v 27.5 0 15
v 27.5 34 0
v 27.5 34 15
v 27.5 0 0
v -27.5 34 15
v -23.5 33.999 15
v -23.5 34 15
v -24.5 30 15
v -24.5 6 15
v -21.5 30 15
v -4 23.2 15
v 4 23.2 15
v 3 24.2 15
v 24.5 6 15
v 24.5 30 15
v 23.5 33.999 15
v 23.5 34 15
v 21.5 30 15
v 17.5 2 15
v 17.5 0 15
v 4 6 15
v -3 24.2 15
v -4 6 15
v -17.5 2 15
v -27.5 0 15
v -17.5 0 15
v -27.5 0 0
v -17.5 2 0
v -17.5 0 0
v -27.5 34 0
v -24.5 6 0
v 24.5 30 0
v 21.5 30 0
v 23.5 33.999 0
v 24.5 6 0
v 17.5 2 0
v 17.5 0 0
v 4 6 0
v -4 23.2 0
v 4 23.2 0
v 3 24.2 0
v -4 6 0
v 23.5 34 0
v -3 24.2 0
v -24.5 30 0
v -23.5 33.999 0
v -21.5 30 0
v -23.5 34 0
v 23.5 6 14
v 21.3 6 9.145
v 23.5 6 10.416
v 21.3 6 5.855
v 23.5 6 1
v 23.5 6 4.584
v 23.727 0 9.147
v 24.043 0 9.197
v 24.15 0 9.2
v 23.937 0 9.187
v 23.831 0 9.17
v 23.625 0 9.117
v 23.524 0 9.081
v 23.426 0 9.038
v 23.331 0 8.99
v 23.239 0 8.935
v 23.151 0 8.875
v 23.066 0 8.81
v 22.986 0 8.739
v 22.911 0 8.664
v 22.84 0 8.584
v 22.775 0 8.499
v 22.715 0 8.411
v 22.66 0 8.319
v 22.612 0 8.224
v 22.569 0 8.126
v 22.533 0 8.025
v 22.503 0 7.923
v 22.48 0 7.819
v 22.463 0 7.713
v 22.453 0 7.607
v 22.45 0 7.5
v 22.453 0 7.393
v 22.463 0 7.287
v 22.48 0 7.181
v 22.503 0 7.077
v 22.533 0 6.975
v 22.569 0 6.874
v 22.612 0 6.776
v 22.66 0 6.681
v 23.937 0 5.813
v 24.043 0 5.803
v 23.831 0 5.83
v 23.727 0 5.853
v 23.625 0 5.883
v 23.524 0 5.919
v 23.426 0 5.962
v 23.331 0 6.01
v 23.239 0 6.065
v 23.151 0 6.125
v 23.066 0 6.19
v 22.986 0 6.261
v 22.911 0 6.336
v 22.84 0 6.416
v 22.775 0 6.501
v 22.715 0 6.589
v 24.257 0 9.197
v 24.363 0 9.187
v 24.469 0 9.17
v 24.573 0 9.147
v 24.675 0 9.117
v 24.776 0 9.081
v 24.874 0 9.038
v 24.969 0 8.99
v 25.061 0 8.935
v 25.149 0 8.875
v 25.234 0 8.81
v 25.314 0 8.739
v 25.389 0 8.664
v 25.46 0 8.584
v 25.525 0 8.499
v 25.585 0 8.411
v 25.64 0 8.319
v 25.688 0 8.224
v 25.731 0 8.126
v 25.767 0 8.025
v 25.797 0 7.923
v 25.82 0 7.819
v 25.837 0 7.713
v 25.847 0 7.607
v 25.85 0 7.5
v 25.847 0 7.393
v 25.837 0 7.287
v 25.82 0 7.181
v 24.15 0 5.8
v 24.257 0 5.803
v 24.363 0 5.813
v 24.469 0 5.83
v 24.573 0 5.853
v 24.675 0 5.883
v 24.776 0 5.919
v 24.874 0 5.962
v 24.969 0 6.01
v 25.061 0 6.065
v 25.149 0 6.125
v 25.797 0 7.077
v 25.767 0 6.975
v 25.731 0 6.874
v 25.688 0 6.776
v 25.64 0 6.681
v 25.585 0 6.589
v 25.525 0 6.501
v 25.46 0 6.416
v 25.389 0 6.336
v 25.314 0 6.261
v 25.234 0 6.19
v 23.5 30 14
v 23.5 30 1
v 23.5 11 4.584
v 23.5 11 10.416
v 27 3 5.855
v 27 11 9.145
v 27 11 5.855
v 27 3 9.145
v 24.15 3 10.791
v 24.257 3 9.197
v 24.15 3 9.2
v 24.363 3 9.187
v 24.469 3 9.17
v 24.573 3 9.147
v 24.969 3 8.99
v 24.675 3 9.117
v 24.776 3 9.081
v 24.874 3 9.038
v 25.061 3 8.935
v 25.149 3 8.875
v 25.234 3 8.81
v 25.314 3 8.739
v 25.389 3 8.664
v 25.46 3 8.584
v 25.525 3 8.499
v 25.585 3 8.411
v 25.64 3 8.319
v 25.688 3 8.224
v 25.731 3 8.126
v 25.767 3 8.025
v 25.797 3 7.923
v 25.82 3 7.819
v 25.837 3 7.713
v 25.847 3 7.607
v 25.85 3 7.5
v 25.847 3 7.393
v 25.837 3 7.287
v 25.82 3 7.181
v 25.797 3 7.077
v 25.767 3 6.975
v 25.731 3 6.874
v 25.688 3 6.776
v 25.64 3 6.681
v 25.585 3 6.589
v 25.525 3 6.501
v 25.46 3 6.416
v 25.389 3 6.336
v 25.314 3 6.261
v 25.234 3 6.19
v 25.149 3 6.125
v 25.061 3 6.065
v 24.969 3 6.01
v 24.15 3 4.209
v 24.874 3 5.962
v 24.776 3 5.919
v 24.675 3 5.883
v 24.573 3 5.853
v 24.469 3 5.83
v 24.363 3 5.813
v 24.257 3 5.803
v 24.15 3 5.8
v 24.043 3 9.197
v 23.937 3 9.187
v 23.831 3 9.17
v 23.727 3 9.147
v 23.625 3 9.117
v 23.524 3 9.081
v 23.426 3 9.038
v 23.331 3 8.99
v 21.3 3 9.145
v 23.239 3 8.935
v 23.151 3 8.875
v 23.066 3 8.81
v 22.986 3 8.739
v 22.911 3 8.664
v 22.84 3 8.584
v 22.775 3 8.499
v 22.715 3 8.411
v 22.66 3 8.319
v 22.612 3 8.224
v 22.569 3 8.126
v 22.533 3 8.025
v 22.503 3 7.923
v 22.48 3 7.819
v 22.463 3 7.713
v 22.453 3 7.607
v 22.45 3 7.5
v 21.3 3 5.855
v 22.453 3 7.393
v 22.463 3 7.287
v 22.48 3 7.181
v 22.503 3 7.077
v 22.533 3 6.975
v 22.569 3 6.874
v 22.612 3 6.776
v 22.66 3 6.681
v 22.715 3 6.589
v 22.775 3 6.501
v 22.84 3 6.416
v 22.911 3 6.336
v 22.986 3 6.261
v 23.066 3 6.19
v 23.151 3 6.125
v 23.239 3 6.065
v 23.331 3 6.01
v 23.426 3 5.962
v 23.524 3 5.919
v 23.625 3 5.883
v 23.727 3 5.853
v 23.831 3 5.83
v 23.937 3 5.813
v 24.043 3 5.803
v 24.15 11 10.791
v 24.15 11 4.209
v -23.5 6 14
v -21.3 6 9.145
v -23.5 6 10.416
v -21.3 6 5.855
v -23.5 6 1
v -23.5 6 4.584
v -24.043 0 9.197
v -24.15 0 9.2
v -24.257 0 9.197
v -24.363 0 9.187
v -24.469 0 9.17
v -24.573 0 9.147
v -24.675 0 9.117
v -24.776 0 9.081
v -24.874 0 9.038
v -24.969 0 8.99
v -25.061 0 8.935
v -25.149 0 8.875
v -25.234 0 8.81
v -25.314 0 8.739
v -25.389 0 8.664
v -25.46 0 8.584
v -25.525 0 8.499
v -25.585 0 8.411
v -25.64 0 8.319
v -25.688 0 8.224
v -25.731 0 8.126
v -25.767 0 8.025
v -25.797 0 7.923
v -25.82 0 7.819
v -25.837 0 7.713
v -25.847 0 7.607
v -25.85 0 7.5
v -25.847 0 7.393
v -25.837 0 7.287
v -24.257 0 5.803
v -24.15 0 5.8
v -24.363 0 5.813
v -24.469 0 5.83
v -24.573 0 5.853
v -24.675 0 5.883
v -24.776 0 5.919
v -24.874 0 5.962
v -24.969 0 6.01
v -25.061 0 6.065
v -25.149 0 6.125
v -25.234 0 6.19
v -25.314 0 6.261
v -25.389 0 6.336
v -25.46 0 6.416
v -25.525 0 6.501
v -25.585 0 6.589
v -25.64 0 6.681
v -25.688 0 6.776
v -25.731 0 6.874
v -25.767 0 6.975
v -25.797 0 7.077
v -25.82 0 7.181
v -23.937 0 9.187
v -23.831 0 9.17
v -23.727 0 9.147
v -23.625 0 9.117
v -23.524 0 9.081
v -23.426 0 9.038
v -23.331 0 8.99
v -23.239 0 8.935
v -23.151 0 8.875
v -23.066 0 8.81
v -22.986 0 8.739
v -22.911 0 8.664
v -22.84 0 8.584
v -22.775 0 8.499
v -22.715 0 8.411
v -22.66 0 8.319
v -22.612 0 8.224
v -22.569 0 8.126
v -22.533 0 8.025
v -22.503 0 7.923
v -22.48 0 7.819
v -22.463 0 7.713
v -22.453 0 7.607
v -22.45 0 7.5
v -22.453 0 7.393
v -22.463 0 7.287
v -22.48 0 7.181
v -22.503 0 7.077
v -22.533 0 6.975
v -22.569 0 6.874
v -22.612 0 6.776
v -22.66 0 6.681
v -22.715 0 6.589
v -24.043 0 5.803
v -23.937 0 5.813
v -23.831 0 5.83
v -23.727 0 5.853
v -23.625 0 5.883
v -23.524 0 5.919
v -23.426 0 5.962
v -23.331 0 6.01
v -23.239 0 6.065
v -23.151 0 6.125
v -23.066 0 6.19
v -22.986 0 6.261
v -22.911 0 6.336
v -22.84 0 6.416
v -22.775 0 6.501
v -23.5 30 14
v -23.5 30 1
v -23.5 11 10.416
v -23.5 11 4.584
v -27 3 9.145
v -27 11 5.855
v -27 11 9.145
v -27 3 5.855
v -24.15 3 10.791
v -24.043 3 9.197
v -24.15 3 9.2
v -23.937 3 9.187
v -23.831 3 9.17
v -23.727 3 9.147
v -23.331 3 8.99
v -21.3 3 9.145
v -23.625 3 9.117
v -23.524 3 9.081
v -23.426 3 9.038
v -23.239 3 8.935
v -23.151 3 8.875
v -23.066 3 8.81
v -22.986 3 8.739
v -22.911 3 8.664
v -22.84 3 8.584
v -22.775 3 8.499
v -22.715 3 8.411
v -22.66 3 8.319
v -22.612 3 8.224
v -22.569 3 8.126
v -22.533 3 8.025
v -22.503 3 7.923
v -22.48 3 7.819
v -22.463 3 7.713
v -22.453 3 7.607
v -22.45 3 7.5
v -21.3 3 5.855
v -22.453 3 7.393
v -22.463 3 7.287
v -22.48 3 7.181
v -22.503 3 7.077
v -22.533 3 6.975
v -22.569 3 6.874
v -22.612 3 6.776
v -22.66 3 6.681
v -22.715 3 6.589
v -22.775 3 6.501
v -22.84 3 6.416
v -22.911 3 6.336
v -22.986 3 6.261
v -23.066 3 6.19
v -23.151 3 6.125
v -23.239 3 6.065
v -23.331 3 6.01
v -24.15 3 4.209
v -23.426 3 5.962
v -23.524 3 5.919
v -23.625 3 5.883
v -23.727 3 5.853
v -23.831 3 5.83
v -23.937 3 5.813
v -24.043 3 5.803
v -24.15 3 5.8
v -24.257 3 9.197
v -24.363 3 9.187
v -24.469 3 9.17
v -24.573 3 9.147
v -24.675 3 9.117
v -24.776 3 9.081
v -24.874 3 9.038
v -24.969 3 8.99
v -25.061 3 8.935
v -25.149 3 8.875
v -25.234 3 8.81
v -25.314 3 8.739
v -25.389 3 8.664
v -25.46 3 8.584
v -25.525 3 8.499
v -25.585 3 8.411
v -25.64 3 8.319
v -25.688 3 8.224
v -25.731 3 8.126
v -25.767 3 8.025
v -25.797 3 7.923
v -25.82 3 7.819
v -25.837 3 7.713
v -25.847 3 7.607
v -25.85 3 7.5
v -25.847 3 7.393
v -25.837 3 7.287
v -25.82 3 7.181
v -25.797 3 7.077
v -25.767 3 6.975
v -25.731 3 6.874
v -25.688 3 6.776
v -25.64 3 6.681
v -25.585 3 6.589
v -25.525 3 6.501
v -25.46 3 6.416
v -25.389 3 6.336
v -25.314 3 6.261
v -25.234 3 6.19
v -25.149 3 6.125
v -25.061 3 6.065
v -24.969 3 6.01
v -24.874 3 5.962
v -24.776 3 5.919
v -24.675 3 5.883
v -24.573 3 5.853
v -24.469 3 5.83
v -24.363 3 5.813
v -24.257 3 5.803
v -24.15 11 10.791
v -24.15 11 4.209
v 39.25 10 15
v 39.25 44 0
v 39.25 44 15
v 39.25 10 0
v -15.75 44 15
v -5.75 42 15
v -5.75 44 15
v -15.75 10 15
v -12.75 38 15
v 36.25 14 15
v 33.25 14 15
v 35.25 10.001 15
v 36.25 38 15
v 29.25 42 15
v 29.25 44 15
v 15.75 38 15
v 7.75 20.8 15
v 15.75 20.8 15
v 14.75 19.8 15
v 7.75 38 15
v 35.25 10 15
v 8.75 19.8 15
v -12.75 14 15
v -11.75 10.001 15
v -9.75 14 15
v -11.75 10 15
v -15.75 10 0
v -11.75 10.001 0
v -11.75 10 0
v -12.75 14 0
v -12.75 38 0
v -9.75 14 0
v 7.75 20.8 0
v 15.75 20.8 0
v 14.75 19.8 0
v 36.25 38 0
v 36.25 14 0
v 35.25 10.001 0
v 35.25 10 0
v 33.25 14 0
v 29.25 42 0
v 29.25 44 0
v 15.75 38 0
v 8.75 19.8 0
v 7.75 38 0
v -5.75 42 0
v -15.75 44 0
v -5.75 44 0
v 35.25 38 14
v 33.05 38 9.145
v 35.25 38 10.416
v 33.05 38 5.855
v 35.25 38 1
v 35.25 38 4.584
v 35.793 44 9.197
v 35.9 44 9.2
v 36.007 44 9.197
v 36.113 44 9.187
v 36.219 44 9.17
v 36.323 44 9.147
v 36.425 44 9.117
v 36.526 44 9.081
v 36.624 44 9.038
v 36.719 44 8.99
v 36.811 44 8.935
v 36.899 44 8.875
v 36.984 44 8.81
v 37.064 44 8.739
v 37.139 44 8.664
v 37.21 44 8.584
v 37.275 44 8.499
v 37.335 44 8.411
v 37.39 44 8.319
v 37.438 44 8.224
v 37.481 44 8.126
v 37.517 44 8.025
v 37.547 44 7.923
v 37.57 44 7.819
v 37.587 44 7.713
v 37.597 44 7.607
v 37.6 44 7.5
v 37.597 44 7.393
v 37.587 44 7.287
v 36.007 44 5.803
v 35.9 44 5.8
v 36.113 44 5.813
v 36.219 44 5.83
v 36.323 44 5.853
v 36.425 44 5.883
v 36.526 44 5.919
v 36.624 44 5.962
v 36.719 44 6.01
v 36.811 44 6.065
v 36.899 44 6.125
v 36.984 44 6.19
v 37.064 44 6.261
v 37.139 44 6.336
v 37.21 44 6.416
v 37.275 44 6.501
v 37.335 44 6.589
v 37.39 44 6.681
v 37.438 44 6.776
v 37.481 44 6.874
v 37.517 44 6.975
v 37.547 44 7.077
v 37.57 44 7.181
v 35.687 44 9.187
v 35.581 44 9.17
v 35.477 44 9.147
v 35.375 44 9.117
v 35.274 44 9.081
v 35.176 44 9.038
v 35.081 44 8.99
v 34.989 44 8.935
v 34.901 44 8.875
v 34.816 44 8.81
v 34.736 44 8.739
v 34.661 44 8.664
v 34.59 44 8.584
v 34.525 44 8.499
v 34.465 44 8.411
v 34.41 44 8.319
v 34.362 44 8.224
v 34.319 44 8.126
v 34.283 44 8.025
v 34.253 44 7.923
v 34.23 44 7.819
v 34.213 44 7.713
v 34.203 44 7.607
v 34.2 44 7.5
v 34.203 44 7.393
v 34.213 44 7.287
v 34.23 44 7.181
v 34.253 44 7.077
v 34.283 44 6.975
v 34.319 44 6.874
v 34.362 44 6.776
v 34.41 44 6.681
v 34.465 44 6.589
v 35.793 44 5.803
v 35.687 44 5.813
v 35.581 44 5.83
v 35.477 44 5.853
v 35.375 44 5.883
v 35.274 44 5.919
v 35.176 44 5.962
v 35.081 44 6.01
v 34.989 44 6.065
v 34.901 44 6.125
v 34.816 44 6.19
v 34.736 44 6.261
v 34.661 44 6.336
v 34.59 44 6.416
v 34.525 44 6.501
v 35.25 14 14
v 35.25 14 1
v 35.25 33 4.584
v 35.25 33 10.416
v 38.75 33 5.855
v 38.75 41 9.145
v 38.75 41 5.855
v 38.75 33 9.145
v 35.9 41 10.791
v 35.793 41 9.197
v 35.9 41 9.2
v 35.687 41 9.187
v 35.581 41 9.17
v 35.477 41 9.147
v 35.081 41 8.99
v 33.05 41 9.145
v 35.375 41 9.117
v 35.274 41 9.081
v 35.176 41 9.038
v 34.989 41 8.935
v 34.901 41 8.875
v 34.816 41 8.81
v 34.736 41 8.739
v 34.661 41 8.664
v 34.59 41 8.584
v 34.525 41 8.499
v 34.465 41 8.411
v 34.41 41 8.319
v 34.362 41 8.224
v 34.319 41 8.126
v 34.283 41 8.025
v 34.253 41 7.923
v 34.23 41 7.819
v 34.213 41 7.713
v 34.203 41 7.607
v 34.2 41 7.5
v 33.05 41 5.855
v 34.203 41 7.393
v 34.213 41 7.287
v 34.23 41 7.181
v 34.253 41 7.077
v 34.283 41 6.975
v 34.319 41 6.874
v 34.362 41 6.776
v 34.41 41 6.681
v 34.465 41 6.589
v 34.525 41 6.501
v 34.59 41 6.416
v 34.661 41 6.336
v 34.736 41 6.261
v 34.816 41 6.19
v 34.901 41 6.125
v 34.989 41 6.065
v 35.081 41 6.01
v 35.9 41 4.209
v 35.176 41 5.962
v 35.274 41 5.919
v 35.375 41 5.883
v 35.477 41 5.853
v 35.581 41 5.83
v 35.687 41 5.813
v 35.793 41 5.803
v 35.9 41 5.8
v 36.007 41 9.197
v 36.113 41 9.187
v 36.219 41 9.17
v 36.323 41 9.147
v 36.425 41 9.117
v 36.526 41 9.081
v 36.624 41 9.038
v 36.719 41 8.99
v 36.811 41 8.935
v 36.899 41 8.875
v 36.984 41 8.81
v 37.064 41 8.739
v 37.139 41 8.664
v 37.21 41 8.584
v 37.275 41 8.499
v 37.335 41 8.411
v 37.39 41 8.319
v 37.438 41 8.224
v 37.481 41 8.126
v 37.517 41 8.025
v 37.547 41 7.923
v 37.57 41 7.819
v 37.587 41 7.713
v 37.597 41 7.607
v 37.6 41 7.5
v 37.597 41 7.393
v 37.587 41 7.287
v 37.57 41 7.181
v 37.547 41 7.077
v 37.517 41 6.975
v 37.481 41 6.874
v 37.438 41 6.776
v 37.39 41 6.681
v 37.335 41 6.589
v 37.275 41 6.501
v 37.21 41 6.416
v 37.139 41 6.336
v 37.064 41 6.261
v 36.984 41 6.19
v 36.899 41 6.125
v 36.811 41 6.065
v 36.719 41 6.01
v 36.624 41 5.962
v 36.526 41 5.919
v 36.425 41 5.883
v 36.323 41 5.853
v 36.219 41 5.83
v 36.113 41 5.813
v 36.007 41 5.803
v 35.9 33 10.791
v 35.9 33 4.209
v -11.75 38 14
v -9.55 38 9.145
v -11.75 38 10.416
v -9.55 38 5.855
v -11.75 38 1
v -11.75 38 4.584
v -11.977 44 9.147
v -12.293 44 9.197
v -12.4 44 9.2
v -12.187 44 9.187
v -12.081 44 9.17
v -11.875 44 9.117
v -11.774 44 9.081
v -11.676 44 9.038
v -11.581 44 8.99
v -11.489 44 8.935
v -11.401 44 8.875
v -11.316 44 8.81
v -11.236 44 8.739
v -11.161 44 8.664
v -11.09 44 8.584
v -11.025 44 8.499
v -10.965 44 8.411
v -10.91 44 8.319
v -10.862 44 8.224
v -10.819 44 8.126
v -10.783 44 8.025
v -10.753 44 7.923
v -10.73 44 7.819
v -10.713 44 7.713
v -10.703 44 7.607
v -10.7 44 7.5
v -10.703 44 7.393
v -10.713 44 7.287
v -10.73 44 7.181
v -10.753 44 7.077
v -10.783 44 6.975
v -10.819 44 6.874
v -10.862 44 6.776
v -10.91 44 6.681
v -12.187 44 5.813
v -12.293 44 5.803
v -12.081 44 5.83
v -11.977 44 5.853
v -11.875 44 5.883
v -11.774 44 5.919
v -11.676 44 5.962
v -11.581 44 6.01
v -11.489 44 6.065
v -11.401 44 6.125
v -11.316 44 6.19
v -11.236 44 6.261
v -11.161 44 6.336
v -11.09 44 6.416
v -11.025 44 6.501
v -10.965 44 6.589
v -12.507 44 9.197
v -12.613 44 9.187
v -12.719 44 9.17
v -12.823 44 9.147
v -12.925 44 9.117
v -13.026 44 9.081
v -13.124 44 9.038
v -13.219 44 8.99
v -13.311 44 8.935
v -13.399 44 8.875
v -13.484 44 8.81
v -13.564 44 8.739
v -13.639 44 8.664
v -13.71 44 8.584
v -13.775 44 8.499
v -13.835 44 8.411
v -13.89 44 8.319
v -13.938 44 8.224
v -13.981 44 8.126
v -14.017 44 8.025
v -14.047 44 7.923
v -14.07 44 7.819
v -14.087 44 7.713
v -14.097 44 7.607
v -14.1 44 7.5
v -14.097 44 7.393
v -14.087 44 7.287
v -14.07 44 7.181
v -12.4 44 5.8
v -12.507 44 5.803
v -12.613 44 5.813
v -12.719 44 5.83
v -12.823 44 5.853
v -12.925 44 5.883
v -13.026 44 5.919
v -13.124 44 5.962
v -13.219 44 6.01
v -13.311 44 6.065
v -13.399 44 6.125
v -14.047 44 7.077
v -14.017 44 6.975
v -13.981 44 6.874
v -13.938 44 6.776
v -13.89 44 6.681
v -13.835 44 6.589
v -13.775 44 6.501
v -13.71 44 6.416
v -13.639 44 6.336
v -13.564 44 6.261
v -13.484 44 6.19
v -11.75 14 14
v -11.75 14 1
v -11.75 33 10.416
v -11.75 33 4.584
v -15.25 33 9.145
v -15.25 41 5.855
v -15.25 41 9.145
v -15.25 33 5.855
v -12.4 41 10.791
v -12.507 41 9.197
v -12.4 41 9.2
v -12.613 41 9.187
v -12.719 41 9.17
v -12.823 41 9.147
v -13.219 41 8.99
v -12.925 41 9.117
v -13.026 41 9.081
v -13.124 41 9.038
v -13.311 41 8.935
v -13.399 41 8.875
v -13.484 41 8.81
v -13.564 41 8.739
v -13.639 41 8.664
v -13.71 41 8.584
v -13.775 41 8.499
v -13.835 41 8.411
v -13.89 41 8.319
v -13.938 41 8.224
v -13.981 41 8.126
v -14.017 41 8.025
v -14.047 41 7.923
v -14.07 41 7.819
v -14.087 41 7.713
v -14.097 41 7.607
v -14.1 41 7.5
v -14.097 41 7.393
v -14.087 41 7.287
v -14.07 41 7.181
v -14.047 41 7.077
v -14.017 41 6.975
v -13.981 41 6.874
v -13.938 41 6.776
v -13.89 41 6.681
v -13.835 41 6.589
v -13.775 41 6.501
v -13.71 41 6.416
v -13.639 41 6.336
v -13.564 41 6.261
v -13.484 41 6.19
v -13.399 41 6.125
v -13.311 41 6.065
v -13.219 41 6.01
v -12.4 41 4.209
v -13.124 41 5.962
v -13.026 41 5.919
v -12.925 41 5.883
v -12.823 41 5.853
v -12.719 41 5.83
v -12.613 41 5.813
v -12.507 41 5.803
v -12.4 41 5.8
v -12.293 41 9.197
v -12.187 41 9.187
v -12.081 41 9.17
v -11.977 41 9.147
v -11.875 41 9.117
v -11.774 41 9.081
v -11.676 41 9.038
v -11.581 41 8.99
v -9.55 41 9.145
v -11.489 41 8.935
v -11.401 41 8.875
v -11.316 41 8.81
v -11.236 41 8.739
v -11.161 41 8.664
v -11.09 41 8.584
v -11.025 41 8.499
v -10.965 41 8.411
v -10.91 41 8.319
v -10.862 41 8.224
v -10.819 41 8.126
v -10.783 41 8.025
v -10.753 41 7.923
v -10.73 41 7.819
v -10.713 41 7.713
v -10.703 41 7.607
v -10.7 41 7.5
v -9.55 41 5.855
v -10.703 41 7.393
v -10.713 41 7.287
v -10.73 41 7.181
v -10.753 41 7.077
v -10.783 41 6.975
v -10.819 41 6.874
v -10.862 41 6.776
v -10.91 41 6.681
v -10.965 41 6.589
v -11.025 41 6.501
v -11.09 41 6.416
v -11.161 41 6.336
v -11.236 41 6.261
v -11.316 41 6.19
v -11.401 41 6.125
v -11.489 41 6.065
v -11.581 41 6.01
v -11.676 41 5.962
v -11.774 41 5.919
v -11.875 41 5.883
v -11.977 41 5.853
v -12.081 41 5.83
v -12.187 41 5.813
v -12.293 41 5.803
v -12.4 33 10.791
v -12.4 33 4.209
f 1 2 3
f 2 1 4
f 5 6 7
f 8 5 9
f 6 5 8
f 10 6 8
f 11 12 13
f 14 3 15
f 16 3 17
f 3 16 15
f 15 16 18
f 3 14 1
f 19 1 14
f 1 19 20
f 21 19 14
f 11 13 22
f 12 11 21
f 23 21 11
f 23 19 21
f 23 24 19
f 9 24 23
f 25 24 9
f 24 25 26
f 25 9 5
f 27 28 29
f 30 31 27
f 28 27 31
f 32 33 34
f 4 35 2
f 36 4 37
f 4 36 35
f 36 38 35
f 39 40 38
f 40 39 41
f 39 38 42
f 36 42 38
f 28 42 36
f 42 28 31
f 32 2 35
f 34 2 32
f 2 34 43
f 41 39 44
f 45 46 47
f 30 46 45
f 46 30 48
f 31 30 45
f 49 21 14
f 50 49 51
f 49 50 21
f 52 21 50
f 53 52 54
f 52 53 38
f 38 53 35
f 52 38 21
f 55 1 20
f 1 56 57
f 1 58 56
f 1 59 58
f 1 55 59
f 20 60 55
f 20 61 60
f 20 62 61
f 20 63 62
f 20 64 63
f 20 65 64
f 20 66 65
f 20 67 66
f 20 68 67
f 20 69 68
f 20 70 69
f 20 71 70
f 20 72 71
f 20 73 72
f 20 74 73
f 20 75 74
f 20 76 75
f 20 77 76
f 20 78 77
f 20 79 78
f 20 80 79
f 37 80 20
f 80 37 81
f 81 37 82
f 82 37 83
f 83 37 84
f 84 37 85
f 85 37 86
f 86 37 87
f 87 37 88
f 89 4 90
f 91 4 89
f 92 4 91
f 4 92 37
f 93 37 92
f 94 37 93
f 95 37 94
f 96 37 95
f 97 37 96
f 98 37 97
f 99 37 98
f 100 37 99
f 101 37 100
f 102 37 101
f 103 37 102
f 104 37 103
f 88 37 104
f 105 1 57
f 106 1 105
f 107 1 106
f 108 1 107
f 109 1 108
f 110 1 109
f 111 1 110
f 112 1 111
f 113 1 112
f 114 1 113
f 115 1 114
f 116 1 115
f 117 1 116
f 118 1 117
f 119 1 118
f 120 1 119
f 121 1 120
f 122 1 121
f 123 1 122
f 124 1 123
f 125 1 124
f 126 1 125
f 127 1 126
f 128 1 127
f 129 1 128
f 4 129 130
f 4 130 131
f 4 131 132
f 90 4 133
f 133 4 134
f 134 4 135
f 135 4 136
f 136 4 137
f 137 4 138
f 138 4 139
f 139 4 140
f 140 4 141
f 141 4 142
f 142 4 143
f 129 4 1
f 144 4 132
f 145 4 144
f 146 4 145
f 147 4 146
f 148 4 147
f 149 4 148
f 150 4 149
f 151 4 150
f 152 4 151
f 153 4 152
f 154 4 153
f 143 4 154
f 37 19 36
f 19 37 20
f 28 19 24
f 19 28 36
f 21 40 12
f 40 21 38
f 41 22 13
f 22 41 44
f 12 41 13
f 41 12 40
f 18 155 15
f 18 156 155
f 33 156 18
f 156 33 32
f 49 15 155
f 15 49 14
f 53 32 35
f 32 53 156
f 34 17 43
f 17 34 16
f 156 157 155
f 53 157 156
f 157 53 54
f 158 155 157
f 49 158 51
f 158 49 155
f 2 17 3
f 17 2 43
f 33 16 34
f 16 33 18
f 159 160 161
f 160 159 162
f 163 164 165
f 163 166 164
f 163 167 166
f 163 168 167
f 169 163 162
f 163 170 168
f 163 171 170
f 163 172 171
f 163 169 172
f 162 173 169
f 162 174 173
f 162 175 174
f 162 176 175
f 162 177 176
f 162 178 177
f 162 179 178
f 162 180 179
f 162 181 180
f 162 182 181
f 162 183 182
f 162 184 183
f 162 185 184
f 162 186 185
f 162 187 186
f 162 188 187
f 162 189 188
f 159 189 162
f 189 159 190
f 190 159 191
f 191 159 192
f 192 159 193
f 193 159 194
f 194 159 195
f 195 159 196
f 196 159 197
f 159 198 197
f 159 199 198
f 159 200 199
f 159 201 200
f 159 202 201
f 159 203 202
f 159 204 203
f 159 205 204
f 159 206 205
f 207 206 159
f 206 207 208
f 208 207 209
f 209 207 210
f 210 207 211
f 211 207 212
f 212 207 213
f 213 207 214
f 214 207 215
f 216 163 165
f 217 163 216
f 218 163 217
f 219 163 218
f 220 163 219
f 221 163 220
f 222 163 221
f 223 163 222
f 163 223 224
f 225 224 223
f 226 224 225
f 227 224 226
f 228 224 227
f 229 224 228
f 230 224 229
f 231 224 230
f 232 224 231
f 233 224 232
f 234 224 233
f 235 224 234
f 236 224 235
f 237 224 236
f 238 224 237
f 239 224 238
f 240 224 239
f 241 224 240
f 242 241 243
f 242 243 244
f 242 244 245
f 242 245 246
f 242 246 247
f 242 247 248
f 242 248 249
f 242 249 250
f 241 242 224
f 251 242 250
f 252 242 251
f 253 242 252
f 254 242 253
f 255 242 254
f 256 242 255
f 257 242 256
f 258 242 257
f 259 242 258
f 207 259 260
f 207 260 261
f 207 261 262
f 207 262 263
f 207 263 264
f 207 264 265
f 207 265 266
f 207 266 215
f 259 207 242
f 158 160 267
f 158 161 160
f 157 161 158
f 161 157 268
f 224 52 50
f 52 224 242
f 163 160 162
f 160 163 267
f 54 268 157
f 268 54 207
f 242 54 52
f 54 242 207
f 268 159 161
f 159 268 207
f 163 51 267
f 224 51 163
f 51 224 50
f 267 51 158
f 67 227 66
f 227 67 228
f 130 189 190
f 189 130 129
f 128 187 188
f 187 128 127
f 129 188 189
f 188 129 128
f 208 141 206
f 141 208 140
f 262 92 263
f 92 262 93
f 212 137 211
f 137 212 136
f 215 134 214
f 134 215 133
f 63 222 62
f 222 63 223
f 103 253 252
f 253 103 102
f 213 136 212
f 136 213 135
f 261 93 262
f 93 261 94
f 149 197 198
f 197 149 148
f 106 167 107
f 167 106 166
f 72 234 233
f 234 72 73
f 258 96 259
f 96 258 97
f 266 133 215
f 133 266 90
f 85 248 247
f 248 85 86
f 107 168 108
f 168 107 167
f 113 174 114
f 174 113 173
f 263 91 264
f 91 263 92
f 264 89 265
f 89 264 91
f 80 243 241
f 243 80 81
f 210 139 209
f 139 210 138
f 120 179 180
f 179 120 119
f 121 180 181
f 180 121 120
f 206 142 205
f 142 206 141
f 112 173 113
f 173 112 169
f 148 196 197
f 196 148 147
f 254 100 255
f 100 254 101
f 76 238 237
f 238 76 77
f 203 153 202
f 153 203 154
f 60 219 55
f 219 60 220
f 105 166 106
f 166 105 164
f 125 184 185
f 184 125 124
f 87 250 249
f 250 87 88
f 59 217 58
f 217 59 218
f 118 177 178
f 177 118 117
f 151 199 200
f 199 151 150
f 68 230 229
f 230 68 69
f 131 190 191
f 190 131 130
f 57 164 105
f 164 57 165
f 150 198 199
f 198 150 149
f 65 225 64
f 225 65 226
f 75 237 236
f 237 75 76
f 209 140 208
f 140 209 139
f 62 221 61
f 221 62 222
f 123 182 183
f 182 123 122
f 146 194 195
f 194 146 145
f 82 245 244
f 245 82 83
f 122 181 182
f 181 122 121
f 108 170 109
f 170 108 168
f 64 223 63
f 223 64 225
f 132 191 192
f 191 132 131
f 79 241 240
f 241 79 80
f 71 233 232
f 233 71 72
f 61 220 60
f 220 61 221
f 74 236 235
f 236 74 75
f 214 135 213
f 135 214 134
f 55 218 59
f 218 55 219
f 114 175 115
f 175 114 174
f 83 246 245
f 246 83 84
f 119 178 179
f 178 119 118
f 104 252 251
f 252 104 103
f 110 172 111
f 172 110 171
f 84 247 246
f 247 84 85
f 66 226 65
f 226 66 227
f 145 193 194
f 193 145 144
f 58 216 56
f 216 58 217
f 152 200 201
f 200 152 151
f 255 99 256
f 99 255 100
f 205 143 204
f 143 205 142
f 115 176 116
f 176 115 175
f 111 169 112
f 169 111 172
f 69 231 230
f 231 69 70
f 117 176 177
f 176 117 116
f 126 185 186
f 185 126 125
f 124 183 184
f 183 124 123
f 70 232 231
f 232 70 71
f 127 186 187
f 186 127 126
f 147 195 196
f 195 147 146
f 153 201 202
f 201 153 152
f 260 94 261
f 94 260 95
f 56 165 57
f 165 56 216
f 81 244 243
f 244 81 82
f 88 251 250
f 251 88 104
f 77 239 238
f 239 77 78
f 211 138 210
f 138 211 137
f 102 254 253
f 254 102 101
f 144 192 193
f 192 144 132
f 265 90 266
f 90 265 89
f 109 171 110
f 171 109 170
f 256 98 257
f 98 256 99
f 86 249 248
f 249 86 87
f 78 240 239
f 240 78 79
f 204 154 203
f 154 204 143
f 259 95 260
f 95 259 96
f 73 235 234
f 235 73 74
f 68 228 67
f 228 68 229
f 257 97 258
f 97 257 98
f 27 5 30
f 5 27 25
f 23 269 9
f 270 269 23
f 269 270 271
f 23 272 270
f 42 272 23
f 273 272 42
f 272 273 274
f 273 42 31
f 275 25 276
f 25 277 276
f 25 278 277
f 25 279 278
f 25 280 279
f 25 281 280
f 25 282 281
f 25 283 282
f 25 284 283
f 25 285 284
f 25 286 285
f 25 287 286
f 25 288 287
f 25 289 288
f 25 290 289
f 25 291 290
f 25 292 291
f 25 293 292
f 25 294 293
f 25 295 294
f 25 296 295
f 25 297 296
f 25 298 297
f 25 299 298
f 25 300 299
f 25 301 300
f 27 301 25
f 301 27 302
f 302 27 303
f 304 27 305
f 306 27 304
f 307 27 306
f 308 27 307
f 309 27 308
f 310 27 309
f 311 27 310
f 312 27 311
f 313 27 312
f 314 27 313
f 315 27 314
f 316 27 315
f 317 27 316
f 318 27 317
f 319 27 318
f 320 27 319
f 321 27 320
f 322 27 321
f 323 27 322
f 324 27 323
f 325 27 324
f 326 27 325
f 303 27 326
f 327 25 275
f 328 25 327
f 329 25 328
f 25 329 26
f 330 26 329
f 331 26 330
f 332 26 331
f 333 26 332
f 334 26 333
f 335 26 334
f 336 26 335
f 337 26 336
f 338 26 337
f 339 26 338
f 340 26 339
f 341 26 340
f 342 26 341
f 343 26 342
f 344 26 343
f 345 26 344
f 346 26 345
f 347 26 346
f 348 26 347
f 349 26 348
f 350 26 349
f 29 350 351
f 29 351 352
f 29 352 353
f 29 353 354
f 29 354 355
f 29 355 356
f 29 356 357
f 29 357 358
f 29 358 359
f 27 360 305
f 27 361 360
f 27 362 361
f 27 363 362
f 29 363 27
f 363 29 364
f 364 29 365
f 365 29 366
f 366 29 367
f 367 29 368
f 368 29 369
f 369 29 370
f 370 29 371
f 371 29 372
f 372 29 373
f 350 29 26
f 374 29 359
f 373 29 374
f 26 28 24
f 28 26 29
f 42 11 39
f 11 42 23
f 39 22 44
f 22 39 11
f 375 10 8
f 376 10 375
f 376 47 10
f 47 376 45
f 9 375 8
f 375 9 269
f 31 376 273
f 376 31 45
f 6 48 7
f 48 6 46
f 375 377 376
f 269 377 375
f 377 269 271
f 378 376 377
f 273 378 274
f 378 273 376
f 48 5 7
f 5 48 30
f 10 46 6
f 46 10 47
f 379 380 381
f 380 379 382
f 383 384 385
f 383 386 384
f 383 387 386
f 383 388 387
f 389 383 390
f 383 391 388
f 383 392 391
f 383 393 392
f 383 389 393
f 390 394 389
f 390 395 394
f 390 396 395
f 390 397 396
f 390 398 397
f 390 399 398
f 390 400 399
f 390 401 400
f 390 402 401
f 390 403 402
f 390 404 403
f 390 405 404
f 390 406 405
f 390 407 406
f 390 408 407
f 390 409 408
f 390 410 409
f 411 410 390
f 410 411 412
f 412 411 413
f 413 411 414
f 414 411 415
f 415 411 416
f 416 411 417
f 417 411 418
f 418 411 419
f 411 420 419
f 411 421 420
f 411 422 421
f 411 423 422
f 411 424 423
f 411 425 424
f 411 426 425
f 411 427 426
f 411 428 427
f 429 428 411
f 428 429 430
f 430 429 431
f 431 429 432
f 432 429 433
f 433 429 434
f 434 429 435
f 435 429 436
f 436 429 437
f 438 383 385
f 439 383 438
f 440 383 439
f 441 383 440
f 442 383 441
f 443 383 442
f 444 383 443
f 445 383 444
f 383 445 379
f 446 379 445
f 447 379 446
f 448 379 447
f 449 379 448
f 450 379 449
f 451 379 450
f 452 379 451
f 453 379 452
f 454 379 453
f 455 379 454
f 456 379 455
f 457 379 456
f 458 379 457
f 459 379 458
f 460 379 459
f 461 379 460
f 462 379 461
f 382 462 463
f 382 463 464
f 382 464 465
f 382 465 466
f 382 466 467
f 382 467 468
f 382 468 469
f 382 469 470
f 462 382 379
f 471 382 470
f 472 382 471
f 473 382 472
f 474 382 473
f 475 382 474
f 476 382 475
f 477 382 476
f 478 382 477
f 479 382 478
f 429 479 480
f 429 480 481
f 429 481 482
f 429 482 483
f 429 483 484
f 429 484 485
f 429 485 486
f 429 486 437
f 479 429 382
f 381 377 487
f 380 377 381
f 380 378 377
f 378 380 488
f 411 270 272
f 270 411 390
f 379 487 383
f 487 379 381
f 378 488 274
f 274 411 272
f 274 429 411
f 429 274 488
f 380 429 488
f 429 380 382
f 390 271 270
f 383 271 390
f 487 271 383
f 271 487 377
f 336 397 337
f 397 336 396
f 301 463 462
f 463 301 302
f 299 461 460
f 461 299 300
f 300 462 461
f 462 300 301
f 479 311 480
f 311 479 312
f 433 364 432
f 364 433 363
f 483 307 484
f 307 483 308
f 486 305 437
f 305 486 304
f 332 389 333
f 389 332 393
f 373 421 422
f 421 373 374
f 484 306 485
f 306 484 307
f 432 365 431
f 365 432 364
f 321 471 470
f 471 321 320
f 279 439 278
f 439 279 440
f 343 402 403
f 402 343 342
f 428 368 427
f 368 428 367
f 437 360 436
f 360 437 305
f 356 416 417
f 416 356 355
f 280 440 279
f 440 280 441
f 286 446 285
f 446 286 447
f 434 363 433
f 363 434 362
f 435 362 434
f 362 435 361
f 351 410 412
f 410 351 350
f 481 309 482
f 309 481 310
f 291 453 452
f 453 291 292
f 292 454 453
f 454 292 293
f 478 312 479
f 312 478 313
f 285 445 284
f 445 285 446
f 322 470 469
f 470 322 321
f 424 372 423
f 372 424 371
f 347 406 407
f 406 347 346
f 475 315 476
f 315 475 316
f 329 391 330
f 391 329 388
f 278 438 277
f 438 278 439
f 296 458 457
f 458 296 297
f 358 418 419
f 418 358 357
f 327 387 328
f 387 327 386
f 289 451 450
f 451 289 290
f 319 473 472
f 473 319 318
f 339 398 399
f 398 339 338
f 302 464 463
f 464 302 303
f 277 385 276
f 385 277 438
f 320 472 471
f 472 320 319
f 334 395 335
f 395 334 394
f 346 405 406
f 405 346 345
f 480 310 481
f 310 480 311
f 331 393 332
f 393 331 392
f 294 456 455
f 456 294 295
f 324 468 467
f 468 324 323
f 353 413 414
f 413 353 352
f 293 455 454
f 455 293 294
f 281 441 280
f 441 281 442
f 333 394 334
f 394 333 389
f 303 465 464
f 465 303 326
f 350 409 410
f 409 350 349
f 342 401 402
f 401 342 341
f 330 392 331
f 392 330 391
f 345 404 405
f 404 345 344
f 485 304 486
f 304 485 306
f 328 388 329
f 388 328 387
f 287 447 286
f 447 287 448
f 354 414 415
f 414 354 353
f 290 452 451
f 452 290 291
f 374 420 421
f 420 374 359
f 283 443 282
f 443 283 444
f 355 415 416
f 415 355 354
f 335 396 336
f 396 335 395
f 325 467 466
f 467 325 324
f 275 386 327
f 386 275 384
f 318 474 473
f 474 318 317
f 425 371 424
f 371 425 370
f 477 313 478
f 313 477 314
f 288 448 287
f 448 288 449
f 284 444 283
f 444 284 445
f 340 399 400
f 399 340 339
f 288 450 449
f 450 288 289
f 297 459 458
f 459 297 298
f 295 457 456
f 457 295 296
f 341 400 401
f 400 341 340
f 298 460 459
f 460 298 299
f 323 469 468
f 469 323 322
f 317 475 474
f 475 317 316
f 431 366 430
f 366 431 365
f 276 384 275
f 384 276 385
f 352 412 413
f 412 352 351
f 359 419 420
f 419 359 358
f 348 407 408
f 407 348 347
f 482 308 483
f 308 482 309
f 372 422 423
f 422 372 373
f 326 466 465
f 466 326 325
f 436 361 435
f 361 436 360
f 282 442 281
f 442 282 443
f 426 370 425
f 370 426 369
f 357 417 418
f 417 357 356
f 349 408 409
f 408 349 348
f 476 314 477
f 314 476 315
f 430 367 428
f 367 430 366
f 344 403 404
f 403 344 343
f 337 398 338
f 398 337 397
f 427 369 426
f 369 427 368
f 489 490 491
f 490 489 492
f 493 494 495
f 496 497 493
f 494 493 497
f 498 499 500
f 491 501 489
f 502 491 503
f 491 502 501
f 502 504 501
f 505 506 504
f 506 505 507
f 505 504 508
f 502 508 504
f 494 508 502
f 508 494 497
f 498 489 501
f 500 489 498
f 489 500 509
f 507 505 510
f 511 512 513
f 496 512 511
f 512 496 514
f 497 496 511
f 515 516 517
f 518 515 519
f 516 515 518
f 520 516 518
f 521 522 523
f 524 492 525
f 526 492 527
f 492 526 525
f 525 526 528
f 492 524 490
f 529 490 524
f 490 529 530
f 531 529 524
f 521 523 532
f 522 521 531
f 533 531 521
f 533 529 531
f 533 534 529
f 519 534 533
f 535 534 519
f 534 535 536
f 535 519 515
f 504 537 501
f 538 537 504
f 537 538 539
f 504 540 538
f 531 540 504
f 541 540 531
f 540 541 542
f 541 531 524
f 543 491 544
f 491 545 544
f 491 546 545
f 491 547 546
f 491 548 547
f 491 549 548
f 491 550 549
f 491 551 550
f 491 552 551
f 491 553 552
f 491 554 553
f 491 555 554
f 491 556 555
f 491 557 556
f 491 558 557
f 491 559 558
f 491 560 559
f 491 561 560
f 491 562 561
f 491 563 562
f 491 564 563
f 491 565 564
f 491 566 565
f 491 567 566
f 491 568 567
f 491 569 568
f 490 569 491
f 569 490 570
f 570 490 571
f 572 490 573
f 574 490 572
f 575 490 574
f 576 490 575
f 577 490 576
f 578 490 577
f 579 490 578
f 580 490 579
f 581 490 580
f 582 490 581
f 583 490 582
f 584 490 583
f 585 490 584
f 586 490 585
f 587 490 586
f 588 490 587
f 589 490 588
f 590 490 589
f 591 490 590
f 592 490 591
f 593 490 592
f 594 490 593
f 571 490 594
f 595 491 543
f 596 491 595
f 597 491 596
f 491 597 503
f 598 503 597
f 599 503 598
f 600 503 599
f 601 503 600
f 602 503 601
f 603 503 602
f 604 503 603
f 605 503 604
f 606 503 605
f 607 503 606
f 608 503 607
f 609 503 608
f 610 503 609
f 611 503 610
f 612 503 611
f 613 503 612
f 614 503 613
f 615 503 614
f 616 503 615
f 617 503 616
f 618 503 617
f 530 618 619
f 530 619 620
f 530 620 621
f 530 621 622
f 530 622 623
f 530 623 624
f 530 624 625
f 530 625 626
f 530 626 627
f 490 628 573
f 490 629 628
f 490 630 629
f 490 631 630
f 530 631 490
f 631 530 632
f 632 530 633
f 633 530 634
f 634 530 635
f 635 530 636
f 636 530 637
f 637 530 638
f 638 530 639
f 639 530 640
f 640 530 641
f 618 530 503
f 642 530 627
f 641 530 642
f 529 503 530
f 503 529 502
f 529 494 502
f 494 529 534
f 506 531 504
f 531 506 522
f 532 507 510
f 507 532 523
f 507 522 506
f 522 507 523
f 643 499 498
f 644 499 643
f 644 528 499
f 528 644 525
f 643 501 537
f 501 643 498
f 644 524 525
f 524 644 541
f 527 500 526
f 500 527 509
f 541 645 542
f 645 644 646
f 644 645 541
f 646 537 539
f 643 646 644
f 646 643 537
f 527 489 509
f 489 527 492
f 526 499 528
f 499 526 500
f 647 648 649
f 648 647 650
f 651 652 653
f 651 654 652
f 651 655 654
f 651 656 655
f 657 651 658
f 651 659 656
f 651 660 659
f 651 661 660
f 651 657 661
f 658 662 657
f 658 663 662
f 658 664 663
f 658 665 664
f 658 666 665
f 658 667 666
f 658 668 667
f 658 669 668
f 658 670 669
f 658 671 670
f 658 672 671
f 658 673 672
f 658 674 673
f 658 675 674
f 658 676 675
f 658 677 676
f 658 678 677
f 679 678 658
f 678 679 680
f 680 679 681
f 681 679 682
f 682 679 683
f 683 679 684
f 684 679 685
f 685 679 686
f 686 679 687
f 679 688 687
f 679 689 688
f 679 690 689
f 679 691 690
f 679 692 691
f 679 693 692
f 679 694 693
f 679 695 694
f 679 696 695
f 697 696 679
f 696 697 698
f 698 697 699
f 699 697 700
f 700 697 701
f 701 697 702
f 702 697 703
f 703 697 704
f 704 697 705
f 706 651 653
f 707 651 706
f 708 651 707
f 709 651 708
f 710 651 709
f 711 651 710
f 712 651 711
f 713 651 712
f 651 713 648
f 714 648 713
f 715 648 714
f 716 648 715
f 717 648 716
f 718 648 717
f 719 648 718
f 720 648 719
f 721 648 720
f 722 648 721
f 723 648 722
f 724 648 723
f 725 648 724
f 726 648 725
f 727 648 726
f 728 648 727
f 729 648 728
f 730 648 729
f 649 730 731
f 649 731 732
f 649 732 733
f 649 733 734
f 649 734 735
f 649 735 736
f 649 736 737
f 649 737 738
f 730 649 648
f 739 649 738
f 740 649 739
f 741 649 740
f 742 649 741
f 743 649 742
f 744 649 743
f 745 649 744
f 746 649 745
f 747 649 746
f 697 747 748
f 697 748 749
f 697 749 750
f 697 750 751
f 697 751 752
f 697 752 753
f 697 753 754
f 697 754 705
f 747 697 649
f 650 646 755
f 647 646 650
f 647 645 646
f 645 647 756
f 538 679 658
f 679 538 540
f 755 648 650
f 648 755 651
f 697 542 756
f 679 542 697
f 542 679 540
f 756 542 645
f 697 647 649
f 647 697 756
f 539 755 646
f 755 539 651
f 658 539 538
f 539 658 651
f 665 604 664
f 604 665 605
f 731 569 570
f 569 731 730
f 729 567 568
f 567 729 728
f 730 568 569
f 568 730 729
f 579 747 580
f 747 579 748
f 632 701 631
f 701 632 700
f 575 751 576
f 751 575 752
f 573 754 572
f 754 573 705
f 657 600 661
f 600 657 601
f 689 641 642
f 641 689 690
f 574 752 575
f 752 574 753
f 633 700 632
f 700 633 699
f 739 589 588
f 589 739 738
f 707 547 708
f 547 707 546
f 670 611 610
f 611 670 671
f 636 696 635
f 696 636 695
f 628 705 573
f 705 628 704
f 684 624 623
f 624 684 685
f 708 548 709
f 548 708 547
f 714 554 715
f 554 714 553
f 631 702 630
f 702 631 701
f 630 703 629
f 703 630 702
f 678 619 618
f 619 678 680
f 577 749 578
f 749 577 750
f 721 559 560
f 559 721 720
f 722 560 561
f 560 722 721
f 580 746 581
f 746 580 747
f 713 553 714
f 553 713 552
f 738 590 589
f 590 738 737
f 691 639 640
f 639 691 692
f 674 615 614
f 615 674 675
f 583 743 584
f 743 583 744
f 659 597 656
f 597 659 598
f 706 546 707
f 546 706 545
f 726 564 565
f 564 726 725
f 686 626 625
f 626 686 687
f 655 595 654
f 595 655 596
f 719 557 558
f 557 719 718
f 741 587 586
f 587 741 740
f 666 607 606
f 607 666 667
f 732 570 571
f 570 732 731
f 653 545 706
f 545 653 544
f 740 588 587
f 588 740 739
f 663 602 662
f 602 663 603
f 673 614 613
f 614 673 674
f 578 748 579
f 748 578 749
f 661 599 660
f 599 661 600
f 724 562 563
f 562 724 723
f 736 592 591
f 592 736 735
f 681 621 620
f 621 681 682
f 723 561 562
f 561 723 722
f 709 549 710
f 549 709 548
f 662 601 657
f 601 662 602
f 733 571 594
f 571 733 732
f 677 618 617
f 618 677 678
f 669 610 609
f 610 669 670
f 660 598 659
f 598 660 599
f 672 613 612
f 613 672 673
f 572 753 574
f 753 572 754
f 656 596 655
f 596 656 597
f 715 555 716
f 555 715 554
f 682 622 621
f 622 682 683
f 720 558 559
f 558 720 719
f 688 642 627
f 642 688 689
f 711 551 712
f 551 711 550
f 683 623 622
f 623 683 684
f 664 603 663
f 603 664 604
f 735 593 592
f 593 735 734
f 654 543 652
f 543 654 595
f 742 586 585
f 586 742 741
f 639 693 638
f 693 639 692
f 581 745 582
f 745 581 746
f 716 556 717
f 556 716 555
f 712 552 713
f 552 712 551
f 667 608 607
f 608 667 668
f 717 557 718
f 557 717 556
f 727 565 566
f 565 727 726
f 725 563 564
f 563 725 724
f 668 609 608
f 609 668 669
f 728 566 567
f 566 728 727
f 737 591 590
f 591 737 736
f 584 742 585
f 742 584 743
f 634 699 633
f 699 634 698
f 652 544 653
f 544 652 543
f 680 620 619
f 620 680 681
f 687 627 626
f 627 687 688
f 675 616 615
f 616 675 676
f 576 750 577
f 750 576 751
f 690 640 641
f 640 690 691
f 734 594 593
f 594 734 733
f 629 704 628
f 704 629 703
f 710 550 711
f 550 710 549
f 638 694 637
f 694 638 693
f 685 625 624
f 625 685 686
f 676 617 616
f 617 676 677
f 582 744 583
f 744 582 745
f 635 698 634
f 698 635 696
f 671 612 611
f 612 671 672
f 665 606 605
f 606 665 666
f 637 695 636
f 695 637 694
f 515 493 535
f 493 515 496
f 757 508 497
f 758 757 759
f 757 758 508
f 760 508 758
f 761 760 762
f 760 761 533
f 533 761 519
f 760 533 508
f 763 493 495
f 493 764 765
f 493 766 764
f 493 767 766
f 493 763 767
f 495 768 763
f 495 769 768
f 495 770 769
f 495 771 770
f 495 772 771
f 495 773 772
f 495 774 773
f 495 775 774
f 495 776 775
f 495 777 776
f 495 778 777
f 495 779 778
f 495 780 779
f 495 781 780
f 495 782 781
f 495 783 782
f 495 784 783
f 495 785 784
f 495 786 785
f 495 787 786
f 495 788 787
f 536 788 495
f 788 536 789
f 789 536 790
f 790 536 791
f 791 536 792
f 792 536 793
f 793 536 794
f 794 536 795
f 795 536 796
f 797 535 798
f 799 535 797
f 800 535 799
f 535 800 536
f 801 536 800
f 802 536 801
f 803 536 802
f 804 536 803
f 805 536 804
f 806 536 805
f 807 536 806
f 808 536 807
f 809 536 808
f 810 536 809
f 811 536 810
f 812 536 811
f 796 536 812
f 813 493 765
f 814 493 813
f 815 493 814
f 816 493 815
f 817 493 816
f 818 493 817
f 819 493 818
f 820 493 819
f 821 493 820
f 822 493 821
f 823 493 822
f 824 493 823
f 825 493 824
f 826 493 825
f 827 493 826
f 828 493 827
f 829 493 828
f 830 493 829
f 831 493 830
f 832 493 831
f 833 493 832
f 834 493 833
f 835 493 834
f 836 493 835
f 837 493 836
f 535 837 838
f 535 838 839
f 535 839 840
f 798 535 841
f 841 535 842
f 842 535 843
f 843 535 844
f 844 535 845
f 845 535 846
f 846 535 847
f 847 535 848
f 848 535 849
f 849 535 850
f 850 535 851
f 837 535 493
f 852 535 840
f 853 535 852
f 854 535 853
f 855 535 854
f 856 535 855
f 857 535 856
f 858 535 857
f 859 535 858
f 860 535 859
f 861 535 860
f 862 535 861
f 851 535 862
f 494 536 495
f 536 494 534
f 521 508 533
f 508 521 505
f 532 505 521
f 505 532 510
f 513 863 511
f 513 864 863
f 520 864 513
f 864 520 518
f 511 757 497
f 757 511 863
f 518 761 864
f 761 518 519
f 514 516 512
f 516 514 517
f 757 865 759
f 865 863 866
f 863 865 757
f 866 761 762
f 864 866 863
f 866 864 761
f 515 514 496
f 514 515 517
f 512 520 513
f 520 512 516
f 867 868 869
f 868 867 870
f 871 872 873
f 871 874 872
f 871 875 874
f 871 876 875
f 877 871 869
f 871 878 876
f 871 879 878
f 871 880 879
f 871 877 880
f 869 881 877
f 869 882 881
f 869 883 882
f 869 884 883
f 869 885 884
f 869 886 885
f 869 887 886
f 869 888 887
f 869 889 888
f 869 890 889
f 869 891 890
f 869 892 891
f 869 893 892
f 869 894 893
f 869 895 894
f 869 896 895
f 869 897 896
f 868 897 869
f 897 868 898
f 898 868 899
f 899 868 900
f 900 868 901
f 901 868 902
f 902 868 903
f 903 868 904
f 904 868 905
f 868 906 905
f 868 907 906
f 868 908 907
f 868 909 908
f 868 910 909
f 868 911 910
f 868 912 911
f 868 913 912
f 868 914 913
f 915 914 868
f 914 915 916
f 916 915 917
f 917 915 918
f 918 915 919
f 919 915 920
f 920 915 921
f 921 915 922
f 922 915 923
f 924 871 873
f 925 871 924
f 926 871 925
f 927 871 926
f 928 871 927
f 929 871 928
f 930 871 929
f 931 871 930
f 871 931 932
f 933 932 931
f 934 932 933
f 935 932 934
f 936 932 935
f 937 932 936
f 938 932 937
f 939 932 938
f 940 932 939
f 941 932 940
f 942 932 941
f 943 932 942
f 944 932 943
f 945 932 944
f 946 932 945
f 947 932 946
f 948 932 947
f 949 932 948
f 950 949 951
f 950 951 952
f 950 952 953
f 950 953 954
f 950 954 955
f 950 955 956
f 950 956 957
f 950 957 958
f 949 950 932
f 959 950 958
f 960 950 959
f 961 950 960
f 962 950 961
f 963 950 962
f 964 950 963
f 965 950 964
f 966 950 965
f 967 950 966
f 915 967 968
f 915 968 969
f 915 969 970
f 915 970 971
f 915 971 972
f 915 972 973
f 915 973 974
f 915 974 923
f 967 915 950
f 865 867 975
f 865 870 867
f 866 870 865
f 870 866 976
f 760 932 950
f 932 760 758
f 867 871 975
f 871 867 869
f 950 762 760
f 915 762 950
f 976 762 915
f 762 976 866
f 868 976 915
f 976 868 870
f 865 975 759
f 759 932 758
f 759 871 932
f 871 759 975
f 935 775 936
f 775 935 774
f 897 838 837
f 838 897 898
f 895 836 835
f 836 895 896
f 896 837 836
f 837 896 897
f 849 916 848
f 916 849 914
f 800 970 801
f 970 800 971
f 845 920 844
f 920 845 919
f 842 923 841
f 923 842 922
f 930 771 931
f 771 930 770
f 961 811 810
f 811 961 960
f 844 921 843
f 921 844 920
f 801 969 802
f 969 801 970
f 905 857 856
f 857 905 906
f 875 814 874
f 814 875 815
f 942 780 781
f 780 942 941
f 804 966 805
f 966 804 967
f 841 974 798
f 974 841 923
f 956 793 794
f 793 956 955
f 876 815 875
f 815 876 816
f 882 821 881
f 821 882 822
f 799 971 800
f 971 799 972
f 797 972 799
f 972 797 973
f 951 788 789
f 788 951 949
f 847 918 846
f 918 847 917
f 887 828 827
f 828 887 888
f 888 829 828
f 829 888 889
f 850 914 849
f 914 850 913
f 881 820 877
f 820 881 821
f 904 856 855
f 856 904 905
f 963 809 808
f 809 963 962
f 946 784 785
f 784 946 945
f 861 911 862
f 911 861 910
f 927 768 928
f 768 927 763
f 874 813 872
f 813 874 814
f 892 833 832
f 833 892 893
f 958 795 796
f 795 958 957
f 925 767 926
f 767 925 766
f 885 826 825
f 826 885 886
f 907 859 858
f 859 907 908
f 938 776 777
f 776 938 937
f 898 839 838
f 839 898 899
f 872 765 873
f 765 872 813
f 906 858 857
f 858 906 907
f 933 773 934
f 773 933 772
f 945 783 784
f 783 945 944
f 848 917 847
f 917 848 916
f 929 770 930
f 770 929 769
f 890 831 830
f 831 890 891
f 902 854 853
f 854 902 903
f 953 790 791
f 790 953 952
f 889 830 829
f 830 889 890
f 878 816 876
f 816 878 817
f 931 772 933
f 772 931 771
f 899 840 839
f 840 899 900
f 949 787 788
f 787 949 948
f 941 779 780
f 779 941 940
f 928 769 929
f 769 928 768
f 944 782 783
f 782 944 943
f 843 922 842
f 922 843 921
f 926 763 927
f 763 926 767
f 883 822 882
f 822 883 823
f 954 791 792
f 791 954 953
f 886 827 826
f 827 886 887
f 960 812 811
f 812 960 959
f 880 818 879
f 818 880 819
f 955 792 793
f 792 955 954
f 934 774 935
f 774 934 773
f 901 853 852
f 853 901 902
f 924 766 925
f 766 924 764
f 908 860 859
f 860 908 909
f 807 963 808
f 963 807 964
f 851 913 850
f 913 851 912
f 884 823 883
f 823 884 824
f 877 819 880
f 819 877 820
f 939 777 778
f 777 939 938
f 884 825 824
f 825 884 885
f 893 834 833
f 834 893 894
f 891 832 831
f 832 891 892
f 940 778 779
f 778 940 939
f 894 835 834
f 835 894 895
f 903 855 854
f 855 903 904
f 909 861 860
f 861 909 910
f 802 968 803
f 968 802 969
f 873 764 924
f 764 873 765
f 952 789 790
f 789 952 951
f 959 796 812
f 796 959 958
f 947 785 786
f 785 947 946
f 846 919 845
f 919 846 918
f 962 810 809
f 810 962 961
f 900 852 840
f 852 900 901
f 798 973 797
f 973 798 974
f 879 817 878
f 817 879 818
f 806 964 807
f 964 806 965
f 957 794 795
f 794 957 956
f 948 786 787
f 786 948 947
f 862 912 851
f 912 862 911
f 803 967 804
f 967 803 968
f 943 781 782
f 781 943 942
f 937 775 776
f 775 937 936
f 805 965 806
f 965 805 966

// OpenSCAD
// Created from Code_Clip_RAMPS.stl
// https://github.com/Mecan0/Code
// By J.Rodigo (www.jra.so)
// Licence Creative commons atribution & share alike.

/**************************/
// Parámetros de la pieza  /
/**************************/

// Características del soporte 
hCen = 19.2;	// Altura del soporte central (19.2)
hClip = 4.8;	// Altura del clip respecto al soporte central (4.8)
wClip = 47;		// Anchura de clip a clip (interior)(47)

//Características del tornillo
dTor = 3.4;		// Diámetro de la rosca (3.4)
hHex = 5.7;		// Altura entre caras planas de la tuerca (5.7)

/**************************/
// Partes para media pieza /
/**************************/

// Bloque de la base del soporte
module base(){
	difference(){
		// Bloque
		cube([wClip/2+4, 6, 15]);
		// Vaciado inferior 
		translate([-1, -1, -1])
		cube([wClip/2-5, 3, 17]);
	}
}

// Bloque central del soporte
module centro(){
	difference(){
		// Bloque central
		translate([0, 4, 0])
		cube([4, hCen+1, 15]);
		// Chaflán a lo largo del eje Z
		translate([3, hCen+5, -1])
		rotate( -45 ,[0, 0, 1])
		cube([2, 1, 17]);
	}
}
// hCen+hClip
// Bloque del clip lateral
module clip(){
	difference(){
		// Cubo del clip a lo largo del eje Y
		translate([wClip/2, 0, 0])
		cube([4, hCen+hClip+10, 15]);
		// Chaflanes
		union(){
			// Chaflán superior
			translate([wClip/2, hCen+hClip+6, 14])
			rotate( 90 ,[1, 0, 0])
			rotate( 45 ,[0, 0, 1])
			cube([2, 1, hCen+hClip]);
			// Chaflán inferior 
			translate([wClip/2+1, hCen+hClip+6, 0])
			rotate( 90 ,[1, 0, 0])
			rotate( 135 ,[0, 0, 1])
			cube([2, 1, hCen+hClip]);
		}
	}
	// Extremo (duro) del clip
	difference(){
		translate([wClip/2-2, hCen+hClip+6, 0])
		cube([6, 4, 15]);
		// Chaflán 
		translate([wClip/2-2, hCen+hClip+6, -1])
		rotate( 63.43 ,[0, 0, 1])
		cube([5, 2, 17]);
	}
}

// Generar un hexágono circunscrito (Diametro,altura) 
module hexagono(d,h){ 
	for (a = [0, 60,120]){ 
		rotate( a, [0, 0, 1])
		cube([d, d*tan(30), h], center = true);
	}
}

// Alojamiento para el tornillo
module tornillo(){
	translate([wClip/2+0.65, 7, 7.5])
	rotate( 90, [1, 0, 0])
	union() {
		hexagono(hHex, 8);
		cylinder(h = 8, r = dTor/2, $fn=100);
	}
}

// Unimos tordas las partes para crear la media Pieza
module mpieza(){
	difference(){
		union(){
			// Bloque de la base del soporte
			base();
			// Bloque central del soporte
			centro();
			// Bloque del clip lateral
			clip();
		}
		// Alojamiento para el tornillo
		tornillo();
	}
}

// Unimos las dos mitades para crear la pieza entera
module pieza(){
	mpieza();
	mirror([ 1, 0, 0 ])
	mpieza();
}

/**************************/
//  Generamos las piezas   /
/**************************/

// Generamos la pieza
	
	pieza();

// Generamos otra pieza desplazada y simétrica

	translate([wClip/4, hCen+hClip+20, 0])
	mirror([ 0, 1, 0 ])
	pieza();
